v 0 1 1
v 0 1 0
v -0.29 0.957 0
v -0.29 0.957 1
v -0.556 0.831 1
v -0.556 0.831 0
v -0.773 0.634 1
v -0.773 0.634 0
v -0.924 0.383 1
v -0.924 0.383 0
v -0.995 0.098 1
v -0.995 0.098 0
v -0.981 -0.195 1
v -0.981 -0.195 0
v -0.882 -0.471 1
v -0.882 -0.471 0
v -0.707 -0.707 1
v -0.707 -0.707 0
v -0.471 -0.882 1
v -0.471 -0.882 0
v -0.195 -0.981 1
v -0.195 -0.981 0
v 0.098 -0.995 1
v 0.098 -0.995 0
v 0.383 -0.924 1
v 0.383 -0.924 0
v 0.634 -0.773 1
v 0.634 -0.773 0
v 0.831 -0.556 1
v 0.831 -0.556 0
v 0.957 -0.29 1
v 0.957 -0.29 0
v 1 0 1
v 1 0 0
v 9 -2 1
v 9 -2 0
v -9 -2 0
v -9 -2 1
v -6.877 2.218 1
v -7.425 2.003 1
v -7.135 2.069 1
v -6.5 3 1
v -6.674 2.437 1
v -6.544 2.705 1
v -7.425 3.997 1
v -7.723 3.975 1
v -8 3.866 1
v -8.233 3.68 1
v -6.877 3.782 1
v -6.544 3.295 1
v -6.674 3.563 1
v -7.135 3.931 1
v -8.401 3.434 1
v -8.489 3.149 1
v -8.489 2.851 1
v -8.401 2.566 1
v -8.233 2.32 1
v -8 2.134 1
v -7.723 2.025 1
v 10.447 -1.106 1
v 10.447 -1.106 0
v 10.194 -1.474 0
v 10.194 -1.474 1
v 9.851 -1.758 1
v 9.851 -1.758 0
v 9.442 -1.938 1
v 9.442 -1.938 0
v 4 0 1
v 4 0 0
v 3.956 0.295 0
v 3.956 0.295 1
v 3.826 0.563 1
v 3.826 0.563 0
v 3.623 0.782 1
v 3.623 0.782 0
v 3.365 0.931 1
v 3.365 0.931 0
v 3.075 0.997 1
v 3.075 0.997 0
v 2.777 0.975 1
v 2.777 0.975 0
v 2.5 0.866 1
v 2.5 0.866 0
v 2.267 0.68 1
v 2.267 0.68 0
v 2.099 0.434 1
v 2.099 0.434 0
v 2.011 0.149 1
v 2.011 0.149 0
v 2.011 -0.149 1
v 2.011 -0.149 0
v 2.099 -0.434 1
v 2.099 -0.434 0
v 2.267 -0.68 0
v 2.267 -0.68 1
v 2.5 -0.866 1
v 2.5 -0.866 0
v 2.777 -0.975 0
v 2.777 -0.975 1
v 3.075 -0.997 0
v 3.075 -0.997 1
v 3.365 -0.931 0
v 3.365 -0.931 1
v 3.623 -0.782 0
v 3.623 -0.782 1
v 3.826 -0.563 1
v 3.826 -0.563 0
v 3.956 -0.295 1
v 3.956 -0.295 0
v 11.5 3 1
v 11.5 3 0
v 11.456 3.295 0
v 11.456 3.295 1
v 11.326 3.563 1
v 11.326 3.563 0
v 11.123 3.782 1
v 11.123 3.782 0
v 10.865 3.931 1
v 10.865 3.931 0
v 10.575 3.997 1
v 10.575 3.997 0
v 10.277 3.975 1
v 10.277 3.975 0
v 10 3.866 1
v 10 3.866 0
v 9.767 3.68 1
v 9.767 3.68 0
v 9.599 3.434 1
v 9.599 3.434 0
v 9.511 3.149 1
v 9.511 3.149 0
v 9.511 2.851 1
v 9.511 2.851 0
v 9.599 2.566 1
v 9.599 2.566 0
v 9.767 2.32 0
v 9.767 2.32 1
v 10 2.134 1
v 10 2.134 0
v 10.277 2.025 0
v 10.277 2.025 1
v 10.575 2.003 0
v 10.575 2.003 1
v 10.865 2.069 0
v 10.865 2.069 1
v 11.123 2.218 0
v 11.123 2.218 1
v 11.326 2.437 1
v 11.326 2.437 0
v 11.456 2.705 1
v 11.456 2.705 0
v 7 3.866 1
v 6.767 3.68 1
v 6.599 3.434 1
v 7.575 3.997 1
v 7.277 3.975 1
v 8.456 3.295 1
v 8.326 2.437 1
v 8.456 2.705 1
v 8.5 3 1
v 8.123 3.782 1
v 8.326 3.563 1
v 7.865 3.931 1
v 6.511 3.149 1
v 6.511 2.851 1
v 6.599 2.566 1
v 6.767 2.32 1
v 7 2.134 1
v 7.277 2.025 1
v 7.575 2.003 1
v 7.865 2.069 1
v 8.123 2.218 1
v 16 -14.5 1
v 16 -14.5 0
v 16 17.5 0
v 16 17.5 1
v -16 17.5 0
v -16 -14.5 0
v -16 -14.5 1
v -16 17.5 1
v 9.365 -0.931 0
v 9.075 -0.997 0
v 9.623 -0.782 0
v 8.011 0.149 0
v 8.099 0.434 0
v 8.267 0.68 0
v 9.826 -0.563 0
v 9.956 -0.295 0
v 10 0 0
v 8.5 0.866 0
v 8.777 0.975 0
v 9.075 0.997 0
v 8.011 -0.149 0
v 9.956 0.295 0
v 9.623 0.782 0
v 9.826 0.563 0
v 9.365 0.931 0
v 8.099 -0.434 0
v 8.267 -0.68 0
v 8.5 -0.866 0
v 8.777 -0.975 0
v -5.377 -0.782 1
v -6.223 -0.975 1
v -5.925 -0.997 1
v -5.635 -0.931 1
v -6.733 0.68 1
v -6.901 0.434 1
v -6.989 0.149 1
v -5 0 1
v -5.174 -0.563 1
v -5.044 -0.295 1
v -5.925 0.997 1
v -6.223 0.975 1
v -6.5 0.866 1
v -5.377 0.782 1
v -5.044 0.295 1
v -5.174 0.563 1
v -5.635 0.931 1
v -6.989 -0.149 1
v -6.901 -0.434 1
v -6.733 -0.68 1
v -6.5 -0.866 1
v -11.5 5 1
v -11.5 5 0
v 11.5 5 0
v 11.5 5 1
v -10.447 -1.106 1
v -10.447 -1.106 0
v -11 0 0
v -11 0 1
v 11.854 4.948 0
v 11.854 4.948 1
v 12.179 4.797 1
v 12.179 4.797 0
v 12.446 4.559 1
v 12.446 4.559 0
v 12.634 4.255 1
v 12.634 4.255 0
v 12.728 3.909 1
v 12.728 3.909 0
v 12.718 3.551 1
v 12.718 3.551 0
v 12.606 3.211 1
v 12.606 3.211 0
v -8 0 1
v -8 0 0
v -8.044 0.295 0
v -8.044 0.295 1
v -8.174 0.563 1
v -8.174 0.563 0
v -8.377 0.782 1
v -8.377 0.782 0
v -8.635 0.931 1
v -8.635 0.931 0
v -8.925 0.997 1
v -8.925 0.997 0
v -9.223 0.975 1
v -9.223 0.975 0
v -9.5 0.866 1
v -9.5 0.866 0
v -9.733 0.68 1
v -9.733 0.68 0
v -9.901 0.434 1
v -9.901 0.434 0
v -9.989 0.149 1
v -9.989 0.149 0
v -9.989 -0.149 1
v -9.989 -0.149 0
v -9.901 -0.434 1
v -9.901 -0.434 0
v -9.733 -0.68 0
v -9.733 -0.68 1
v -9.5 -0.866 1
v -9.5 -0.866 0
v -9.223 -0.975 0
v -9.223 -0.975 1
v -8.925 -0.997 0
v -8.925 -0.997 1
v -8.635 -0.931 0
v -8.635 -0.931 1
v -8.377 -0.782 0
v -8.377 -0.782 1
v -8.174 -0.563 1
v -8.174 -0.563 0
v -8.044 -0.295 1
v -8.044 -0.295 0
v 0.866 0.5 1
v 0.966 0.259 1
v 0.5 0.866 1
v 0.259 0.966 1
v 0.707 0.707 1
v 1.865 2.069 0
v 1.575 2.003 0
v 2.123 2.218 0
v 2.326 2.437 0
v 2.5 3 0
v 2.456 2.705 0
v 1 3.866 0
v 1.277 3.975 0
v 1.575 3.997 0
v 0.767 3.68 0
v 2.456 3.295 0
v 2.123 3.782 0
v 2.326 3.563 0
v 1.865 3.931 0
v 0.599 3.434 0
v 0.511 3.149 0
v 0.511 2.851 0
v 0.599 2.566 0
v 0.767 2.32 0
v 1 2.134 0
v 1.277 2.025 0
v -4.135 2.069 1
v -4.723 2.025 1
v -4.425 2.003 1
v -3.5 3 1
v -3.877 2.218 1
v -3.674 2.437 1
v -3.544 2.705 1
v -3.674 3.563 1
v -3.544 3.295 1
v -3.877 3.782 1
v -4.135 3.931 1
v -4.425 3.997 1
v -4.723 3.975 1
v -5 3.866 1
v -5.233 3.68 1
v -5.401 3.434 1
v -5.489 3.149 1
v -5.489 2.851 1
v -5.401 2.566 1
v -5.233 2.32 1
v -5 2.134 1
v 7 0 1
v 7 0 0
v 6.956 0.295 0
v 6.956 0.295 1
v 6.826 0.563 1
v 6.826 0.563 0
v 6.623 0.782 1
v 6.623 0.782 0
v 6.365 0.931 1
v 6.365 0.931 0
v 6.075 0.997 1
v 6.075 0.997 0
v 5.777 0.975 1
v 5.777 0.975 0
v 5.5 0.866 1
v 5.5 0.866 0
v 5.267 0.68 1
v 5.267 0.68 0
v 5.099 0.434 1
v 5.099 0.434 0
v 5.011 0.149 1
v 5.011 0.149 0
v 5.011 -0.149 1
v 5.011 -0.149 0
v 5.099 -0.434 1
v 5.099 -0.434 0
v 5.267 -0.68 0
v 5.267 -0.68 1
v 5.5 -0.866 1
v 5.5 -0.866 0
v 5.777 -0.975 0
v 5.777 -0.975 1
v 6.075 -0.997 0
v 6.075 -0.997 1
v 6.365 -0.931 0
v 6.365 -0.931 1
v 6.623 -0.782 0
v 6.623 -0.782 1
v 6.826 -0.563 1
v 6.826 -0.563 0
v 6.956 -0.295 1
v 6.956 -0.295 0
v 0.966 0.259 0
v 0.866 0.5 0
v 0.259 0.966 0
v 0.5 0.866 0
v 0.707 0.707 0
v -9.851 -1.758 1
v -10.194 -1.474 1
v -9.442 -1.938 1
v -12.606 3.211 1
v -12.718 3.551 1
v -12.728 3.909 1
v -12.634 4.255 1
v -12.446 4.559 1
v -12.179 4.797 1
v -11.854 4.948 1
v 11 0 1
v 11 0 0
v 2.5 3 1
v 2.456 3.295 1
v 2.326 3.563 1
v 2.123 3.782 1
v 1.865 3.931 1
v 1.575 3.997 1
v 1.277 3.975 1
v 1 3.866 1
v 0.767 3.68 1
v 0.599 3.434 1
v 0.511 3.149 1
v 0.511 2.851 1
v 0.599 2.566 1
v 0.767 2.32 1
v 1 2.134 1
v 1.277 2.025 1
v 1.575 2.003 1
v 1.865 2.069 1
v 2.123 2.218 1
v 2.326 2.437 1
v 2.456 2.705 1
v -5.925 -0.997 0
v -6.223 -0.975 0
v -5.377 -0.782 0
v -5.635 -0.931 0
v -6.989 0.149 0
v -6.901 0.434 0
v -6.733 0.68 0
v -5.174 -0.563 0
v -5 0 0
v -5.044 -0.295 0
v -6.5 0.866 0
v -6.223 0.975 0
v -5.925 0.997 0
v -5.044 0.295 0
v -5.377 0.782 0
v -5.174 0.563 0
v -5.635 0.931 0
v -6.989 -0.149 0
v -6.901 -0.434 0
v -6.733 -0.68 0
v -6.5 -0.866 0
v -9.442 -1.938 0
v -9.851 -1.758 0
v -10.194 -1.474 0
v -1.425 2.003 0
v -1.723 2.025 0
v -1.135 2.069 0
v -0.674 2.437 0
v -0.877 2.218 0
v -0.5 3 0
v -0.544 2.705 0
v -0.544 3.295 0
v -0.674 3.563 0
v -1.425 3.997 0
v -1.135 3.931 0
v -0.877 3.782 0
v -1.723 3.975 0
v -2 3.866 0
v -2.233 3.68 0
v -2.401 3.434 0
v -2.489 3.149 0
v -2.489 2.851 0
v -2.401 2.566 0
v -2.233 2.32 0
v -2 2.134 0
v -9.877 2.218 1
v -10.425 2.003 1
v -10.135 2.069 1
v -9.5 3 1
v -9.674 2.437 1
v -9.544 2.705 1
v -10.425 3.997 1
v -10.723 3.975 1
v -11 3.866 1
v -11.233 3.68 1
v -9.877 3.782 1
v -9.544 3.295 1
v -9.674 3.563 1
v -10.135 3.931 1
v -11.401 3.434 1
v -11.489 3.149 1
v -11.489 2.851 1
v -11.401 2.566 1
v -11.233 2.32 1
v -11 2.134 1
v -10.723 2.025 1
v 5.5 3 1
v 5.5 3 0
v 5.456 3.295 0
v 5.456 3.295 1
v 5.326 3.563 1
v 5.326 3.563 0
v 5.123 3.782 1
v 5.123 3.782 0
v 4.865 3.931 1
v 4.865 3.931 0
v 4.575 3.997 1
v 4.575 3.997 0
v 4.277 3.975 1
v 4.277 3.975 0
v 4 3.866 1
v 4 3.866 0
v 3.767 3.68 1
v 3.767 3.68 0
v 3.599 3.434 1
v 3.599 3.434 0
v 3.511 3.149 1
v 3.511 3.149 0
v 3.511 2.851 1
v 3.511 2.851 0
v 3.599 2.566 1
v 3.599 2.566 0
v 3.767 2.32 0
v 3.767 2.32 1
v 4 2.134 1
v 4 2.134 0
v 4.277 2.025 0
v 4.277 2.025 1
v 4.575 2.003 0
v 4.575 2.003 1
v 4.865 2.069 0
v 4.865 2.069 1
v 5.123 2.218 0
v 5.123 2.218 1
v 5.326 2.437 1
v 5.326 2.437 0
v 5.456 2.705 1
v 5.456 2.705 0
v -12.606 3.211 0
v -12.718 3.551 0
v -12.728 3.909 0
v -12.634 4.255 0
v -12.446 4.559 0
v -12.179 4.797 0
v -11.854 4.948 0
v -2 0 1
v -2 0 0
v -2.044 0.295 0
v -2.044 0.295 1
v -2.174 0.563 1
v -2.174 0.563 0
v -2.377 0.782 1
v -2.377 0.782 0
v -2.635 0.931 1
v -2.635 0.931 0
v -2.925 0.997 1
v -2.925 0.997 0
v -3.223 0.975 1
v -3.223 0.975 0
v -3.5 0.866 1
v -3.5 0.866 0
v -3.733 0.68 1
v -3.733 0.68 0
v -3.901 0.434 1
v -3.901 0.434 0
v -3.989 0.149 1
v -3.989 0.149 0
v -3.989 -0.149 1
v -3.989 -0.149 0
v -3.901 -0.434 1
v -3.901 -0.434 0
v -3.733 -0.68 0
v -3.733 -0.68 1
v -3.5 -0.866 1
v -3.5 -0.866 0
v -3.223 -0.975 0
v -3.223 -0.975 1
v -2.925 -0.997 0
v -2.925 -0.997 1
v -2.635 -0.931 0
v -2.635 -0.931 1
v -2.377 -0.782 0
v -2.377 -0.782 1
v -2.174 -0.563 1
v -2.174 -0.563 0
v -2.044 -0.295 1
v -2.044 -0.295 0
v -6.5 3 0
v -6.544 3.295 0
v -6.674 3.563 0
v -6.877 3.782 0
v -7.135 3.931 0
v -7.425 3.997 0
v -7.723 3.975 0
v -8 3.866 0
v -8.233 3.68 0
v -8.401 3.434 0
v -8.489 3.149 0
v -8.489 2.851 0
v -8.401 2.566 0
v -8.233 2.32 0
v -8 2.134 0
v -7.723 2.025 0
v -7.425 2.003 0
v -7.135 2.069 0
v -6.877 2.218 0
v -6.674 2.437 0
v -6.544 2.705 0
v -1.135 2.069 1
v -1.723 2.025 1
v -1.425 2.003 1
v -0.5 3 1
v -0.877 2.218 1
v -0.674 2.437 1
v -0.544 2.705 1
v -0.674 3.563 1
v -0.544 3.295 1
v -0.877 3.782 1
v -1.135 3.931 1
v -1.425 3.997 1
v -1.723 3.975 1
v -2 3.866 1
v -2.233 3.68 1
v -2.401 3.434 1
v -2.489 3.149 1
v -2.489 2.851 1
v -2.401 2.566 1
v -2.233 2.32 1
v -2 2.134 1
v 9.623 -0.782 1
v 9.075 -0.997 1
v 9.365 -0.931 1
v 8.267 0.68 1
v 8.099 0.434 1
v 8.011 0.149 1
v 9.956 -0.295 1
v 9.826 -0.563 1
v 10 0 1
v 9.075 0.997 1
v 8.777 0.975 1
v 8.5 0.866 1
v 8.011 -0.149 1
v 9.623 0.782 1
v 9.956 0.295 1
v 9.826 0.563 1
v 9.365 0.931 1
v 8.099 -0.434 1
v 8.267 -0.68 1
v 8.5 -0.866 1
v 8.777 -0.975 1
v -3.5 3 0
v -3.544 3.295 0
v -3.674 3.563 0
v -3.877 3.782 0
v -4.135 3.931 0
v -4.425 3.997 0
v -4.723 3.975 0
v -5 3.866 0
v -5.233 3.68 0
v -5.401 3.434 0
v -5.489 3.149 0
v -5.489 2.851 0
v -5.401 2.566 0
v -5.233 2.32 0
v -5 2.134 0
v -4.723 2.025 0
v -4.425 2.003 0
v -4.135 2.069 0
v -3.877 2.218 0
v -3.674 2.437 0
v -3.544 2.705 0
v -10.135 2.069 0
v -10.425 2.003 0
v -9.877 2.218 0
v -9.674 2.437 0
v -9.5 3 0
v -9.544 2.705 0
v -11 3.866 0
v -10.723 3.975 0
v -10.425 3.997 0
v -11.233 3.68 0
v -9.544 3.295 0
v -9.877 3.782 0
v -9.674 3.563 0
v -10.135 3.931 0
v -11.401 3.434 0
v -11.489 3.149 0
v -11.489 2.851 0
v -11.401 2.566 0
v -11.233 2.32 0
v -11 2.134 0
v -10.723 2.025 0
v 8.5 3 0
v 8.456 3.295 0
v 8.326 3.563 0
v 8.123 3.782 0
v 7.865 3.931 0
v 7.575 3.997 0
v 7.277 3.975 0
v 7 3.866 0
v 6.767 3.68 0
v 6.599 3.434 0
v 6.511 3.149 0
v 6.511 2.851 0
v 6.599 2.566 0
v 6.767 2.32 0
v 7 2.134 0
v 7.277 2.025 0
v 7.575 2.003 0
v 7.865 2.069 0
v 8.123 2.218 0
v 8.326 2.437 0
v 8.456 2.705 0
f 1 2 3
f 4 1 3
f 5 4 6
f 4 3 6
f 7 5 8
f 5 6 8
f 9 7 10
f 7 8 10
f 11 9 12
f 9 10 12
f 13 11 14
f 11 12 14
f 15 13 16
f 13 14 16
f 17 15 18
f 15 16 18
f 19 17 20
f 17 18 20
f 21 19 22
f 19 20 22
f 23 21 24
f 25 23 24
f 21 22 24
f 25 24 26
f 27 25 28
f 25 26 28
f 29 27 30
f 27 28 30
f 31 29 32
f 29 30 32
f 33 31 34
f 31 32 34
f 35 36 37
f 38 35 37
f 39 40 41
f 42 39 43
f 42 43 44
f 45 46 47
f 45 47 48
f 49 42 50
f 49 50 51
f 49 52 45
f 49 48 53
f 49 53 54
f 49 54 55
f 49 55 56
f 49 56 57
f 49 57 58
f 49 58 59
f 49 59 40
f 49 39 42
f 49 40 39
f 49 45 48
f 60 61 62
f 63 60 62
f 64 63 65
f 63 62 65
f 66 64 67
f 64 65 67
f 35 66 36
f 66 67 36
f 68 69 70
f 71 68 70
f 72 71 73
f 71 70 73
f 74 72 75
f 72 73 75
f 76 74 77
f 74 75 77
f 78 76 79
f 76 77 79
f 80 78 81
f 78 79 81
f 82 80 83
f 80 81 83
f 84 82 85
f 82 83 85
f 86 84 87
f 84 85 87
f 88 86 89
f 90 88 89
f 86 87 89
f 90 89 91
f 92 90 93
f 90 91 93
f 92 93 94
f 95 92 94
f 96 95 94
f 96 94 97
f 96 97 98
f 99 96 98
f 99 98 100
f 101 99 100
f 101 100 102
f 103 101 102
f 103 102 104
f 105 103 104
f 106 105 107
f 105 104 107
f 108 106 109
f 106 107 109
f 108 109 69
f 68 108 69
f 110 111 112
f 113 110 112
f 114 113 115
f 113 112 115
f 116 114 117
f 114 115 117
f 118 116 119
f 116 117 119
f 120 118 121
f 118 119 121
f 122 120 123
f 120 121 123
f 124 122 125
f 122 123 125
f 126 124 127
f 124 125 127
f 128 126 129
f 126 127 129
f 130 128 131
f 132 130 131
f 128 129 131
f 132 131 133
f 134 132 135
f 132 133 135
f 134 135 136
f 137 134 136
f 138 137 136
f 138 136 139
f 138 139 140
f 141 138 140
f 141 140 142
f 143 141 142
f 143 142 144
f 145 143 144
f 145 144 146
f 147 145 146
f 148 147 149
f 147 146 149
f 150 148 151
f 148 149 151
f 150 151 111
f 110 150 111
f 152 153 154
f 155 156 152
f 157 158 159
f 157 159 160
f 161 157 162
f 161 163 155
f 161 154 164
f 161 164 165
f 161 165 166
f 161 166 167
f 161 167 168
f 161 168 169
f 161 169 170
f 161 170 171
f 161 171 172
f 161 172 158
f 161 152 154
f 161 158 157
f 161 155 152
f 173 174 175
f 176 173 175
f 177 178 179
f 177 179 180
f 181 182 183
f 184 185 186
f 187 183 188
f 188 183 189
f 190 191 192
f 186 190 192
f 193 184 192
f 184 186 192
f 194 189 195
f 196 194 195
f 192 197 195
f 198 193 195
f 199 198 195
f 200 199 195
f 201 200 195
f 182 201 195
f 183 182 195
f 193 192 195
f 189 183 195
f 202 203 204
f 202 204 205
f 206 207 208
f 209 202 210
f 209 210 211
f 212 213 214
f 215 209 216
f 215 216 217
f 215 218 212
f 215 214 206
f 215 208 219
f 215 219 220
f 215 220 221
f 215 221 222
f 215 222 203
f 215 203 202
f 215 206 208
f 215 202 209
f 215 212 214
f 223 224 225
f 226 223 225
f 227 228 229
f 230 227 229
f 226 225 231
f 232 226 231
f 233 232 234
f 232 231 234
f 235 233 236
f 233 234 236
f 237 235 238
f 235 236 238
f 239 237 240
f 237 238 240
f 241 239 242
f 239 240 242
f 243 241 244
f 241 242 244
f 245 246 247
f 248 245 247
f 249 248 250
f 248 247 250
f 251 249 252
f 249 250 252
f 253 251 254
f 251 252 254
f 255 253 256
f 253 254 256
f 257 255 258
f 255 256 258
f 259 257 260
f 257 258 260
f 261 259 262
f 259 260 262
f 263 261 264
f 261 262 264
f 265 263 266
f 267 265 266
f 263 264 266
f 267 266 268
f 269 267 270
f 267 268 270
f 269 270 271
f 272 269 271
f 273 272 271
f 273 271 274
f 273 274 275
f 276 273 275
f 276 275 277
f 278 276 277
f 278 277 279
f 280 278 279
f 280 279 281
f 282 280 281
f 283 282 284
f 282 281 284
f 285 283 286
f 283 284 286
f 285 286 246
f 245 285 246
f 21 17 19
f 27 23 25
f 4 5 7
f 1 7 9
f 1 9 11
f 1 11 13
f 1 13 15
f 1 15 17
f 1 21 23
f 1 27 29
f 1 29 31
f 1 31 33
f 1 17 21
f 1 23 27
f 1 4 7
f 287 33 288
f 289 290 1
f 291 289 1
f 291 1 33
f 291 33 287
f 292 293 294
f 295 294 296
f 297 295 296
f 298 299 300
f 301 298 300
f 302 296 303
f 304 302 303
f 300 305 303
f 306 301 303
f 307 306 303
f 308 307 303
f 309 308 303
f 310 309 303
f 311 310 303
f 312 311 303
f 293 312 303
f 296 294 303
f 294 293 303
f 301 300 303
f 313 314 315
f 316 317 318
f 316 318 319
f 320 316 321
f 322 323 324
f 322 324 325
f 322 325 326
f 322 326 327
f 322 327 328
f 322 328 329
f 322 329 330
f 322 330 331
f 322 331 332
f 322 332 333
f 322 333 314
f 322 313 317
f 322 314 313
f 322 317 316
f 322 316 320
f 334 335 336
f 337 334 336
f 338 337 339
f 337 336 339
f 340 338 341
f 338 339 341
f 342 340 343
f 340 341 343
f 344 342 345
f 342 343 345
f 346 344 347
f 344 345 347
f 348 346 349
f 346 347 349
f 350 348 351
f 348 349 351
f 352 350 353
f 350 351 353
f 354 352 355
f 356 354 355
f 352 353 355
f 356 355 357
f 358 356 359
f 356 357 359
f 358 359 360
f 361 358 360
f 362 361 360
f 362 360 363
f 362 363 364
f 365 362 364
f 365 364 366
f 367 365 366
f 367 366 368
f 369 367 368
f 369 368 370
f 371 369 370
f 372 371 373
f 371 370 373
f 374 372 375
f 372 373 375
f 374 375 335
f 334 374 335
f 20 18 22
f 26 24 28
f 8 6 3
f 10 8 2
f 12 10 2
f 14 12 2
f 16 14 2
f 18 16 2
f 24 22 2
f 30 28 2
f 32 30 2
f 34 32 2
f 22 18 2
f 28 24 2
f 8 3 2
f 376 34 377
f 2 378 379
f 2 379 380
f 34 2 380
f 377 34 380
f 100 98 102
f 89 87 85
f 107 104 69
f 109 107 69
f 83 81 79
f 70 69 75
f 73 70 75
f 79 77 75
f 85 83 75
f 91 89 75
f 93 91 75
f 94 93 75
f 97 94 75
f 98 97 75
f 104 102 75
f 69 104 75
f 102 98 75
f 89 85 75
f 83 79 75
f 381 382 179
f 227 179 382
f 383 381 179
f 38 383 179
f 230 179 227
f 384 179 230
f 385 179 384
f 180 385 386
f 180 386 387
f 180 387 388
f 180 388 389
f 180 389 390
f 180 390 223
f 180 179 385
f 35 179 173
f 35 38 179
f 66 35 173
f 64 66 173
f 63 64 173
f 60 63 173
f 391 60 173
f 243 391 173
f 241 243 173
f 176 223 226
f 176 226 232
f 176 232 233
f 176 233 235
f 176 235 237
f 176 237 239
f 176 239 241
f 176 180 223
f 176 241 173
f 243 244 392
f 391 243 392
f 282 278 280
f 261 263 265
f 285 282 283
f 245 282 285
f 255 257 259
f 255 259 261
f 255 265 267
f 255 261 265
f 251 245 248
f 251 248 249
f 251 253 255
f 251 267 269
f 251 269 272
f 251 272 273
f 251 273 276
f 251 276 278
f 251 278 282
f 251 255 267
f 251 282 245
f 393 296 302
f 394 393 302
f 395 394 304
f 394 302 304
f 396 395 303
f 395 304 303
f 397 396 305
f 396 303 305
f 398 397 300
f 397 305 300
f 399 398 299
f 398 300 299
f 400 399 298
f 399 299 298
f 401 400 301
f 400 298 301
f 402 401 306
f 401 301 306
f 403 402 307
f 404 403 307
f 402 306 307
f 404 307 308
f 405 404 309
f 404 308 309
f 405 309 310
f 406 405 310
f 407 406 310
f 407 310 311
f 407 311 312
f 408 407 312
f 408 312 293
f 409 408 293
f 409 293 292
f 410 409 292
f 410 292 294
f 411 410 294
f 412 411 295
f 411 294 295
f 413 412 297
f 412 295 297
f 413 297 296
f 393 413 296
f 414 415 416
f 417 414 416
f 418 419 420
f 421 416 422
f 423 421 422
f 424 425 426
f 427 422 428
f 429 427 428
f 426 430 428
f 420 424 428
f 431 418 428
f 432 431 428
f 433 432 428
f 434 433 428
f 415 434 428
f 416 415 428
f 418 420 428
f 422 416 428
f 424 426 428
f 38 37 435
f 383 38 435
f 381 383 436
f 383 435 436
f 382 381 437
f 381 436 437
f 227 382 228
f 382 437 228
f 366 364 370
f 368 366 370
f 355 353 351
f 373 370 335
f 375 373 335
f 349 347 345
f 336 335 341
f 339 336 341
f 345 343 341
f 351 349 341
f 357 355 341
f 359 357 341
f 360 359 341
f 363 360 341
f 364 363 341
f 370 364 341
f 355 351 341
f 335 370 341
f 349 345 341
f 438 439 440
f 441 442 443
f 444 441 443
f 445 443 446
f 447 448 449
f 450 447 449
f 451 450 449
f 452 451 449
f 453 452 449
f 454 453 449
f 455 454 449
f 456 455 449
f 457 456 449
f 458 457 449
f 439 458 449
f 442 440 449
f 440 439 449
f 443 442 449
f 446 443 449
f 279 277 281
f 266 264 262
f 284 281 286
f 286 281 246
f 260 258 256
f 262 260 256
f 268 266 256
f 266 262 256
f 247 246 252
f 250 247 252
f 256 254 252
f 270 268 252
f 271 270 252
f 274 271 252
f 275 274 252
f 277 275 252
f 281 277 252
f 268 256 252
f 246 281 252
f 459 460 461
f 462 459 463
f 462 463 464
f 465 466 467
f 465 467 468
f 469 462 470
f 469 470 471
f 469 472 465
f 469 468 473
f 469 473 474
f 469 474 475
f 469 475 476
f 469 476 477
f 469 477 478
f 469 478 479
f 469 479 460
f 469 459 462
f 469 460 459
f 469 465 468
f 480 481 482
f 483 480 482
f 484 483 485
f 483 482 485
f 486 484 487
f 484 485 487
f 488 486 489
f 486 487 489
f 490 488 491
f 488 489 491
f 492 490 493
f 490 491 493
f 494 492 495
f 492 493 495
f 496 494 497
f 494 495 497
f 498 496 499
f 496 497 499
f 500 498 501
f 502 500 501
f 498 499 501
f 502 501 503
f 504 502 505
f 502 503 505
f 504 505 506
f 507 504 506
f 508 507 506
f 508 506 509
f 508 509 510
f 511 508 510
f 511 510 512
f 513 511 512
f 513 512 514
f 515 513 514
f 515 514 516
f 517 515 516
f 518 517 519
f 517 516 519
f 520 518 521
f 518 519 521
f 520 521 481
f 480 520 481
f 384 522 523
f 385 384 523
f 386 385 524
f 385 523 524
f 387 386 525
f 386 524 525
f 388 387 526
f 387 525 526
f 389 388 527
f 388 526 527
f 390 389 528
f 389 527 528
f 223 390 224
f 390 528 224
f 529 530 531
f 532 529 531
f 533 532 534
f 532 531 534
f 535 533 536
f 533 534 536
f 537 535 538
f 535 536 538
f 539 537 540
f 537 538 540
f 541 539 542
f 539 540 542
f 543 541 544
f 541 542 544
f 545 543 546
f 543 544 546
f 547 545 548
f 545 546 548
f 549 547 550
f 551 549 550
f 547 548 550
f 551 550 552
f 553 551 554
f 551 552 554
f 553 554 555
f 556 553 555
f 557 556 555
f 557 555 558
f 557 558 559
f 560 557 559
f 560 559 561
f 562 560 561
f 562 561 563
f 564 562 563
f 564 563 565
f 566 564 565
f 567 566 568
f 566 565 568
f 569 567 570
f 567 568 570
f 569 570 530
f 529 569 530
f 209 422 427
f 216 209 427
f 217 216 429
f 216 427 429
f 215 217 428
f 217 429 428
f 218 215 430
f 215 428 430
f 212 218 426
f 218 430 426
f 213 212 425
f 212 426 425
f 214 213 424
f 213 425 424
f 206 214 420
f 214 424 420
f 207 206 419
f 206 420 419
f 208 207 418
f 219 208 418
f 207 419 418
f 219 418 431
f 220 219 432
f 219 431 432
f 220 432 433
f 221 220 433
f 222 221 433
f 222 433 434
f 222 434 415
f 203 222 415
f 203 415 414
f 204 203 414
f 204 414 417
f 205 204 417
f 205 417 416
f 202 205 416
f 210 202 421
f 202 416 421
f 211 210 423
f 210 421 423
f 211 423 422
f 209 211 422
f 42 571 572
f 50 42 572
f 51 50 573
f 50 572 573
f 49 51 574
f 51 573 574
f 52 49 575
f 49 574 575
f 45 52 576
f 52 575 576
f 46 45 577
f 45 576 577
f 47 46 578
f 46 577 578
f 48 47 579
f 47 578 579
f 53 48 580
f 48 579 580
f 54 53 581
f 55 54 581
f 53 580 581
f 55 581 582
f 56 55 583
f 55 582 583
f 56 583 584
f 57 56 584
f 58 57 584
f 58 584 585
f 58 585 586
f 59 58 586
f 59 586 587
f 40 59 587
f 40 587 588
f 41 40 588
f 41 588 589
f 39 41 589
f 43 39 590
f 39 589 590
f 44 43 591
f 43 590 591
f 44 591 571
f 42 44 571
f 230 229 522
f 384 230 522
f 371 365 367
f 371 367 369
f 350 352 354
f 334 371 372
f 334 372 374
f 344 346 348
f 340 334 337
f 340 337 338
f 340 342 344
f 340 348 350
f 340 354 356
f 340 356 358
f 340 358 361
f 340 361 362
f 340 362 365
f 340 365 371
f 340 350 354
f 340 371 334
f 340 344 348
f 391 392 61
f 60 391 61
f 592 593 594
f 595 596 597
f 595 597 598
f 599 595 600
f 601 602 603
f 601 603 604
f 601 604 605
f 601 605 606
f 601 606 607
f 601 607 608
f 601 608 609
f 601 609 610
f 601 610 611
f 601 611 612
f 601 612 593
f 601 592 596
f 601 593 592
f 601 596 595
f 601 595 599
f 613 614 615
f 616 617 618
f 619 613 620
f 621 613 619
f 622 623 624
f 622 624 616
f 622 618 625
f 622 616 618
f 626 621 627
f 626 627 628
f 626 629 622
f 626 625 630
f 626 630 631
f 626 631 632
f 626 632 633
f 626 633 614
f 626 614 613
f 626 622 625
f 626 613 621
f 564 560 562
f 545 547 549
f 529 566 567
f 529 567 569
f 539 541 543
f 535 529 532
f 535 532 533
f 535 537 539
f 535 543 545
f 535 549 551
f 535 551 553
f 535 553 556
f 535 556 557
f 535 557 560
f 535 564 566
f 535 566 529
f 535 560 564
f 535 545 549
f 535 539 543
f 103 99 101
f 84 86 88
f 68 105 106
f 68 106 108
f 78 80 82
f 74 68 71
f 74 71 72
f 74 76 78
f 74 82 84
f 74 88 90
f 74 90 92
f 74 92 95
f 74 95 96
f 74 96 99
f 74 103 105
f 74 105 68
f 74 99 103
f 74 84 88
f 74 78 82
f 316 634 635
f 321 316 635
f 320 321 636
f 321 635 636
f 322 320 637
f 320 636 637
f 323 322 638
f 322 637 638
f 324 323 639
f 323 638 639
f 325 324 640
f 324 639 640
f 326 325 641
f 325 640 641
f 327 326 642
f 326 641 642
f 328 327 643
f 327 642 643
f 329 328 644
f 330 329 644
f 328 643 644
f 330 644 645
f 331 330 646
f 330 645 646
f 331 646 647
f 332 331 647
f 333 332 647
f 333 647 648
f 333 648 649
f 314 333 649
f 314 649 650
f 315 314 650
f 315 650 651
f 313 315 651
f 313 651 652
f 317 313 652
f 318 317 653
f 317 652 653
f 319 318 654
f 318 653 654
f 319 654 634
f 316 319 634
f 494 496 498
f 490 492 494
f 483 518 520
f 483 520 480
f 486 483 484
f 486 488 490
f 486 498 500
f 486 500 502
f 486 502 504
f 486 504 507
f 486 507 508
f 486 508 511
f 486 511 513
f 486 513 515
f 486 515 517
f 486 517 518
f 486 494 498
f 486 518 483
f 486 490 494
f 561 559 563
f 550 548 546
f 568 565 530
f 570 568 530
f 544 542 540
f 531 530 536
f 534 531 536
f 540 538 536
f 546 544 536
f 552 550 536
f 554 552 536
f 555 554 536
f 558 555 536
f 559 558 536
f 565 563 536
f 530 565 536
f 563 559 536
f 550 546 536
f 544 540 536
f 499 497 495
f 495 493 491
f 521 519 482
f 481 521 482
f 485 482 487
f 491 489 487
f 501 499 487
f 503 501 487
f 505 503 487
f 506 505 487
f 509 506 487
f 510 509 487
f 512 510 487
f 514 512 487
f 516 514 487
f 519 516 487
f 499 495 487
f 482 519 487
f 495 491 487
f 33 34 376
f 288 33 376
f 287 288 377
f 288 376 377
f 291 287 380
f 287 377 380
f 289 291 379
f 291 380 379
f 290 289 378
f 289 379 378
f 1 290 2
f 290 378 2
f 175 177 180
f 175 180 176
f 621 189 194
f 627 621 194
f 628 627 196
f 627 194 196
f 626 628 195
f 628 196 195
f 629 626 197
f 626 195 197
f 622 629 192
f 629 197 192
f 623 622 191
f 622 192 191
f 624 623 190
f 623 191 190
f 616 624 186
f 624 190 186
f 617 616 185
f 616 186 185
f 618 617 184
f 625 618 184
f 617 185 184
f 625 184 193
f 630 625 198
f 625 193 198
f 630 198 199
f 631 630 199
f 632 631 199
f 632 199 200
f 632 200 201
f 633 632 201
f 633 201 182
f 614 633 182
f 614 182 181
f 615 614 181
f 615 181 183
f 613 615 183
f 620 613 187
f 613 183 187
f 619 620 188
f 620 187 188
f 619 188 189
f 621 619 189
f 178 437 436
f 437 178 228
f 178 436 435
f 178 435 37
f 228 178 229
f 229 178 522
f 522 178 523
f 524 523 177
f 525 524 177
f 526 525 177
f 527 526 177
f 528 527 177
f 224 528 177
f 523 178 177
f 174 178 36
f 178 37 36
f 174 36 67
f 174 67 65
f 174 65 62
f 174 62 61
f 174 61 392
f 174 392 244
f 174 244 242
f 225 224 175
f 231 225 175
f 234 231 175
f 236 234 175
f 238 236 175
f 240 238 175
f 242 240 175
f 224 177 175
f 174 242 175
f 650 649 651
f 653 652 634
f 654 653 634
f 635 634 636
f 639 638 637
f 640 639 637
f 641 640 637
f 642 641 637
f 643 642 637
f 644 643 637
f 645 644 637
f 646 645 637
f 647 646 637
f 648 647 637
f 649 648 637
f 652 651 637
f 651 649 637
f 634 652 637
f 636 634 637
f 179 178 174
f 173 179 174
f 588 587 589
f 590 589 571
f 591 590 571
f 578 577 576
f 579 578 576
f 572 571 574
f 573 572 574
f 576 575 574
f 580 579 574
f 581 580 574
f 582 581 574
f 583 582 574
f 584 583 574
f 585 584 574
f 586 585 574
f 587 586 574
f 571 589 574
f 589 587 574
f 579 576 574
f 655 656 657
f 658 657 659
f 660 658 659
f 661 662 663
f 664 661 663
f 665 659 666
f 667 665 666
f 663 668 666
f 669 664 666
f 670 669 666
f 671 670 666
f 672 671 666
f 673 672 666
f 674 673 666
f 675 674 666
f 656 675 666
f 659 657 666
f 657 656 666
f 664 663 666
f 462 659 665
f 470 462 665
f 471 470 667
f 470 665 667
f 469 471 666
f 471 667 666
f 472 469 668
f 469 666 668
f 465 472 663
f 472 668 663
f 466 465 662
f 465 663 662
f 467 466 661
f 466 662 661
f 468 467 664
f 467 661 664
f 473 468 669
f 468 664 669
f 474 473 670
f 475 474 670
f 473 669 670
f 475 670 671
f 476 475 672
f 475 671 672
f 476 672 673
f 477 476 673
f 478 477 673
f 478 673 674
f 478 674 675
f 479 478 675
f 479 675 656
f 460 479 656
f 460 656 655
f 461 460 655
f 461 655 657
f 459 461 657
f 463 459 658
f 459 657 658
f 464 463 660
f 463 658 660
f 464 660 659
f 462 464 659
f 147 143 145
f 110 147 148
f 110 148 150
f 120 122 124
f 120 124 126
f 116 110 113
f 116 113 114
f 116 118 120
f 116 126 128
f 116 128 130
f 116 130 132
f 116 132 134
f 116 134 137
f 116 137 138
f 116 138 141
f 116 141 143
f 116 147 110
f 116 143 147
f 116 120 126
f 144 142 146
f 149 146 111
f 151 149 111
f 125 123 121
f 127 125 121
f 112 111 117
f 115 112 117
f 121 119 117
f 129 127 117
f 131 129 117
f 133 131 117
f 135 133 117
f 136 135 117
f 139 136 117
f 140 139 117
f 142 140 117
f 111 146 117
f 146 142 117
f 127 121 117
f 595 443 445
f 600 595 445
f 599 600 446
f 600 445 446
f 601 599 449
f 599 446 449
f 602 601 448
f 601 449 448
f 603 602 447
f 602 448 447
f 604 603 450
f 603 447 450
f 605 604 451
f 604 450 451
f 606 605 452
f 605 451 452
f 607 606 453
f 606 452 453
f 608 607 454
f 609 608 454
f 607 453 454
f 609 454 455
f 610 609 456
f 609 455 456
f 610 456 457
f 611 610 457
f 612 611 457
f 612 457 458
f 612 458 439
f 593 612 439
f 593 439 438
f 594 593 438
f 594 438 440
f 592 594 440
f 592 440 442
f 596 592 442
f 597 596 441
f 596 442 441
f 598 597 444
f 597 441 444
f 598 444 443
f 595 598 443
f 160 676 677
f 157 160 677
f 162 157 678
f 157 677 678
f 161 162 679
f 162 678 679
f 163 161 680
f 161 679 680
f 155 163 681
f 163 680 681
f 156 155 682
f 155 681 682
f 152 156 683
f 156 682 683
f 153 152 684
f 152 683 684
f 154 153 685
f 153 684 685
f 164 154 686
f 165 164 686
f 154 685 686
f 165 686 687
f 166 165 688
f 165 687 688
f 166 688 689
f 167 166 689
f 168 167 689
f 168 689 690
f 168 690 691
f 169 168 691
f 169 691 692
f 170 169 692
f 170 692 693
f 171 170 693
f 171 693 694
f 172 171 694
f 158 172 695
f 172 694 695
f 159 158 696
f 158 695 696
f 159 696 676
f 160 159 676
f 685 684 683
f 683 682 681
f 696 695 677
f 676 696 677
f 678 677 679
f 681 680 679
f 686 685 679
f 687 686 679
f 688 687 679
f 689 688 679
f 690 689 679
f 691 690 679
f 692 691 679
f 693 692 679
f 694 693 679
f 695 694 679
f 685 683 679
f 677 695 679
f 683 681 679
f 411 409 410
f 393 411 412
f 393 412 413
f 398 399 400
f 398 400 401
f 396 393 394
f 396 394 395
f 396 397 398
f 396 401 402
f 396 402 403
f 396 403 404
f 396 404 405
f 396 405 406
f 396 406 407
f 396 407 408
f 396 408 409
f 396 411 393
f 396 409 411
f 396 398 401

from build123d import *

# Parameters (mm, degrees)
F0_R     = 1
F1_DEPTH = 1
F0_W     = 32
F0_H     = 32
F2_DEPTH = 1


with BuildPart() as f1:
    # F0 (on Top) → F1 (new body)
    with BuildSketch(Plane.XY):
        with Locations((-10.5, 3)):
            Circle(F0_R)
        with Locations((-7.5, 3)):
            Circle(F0_R)
        with Locations((-4.5, 3)):
            Circle(F0_R)
        with Locations((-1.5, 3)):
            Circle(F0_R)
        with Locations((1.5, 3)):
            Circle(F0_R)
        with Locations((4.5, 3)):
            Circle(F0_R)
        with Locations((7.5, 3)):
            Circle(F0_R)
        with Locations((10.5, 3)):
            Circle(F0_R)
        with Locations((-9, 0)):
            Circle(F0_R)
        with Locations((-6, 0)):
            Circle(F0_R)
        with Locations((-3, 0)):
            Circle(F0_R)
        with BuildLine():
            ThreePointArc((0, 1), (-0.707107, -0.707107), (1, 0))
            ThreePointArc((1, 0), (0.707107, 0.707107), (0, 1))
        make_face()
        with Locations((3, 0)):
            Circle(F0_R)
        with Locations((6, 0)):
            Circle(F0_R)
        with Locations((9, 0)):
            Circle(F0_R)
    extrude(amount=F1_DEPTH)


with BuildPart() as f2:
    # F0 (on Top) → F2 (new body)
    with BuildSketch(Plane.XY):
        with Locations((0, 1.5)):
            Rectangle(F0_W, F0_H)
        with BuildLine():
            Line((9, -2), (-9, -2))
            ThreePointArc((-9, -2), (-9.850651, -1.758348), (-10.447214, -1.105573))
            Line((-10.447214, -1.105573), (-11, 0))
            Line((-11, 0), (-12.5, 3))
            Line((-12.5, 3), (-12.605573, 3.211146))
            ThreePointArc((-12.605573, 3.211146), (-12.551462, 4.413771), (-11.5, 5))
            Line((-11.5, 5), (-10.5, 5))
            Line((-10.5, 5), (11.5, 5))
            ThreePointArc((11.5, 5), (12.551462, 4.413771), (12.605573, 3.211146))
            Line((12.605573, 3.211146), (12.5, 3))
            Line((12.5, 3), (11, 0))
            Line((11, 0), (10.447214, -1.105573))
            ThreePointArc((10.447214, -1.105573), (9.850651, -1.758348), (9, -2))
        make_face(mode=Mode.SUBTRACT)
    extrude(amount=F2_DEPTH)


solid = Compound([f1.part, f2.part])
